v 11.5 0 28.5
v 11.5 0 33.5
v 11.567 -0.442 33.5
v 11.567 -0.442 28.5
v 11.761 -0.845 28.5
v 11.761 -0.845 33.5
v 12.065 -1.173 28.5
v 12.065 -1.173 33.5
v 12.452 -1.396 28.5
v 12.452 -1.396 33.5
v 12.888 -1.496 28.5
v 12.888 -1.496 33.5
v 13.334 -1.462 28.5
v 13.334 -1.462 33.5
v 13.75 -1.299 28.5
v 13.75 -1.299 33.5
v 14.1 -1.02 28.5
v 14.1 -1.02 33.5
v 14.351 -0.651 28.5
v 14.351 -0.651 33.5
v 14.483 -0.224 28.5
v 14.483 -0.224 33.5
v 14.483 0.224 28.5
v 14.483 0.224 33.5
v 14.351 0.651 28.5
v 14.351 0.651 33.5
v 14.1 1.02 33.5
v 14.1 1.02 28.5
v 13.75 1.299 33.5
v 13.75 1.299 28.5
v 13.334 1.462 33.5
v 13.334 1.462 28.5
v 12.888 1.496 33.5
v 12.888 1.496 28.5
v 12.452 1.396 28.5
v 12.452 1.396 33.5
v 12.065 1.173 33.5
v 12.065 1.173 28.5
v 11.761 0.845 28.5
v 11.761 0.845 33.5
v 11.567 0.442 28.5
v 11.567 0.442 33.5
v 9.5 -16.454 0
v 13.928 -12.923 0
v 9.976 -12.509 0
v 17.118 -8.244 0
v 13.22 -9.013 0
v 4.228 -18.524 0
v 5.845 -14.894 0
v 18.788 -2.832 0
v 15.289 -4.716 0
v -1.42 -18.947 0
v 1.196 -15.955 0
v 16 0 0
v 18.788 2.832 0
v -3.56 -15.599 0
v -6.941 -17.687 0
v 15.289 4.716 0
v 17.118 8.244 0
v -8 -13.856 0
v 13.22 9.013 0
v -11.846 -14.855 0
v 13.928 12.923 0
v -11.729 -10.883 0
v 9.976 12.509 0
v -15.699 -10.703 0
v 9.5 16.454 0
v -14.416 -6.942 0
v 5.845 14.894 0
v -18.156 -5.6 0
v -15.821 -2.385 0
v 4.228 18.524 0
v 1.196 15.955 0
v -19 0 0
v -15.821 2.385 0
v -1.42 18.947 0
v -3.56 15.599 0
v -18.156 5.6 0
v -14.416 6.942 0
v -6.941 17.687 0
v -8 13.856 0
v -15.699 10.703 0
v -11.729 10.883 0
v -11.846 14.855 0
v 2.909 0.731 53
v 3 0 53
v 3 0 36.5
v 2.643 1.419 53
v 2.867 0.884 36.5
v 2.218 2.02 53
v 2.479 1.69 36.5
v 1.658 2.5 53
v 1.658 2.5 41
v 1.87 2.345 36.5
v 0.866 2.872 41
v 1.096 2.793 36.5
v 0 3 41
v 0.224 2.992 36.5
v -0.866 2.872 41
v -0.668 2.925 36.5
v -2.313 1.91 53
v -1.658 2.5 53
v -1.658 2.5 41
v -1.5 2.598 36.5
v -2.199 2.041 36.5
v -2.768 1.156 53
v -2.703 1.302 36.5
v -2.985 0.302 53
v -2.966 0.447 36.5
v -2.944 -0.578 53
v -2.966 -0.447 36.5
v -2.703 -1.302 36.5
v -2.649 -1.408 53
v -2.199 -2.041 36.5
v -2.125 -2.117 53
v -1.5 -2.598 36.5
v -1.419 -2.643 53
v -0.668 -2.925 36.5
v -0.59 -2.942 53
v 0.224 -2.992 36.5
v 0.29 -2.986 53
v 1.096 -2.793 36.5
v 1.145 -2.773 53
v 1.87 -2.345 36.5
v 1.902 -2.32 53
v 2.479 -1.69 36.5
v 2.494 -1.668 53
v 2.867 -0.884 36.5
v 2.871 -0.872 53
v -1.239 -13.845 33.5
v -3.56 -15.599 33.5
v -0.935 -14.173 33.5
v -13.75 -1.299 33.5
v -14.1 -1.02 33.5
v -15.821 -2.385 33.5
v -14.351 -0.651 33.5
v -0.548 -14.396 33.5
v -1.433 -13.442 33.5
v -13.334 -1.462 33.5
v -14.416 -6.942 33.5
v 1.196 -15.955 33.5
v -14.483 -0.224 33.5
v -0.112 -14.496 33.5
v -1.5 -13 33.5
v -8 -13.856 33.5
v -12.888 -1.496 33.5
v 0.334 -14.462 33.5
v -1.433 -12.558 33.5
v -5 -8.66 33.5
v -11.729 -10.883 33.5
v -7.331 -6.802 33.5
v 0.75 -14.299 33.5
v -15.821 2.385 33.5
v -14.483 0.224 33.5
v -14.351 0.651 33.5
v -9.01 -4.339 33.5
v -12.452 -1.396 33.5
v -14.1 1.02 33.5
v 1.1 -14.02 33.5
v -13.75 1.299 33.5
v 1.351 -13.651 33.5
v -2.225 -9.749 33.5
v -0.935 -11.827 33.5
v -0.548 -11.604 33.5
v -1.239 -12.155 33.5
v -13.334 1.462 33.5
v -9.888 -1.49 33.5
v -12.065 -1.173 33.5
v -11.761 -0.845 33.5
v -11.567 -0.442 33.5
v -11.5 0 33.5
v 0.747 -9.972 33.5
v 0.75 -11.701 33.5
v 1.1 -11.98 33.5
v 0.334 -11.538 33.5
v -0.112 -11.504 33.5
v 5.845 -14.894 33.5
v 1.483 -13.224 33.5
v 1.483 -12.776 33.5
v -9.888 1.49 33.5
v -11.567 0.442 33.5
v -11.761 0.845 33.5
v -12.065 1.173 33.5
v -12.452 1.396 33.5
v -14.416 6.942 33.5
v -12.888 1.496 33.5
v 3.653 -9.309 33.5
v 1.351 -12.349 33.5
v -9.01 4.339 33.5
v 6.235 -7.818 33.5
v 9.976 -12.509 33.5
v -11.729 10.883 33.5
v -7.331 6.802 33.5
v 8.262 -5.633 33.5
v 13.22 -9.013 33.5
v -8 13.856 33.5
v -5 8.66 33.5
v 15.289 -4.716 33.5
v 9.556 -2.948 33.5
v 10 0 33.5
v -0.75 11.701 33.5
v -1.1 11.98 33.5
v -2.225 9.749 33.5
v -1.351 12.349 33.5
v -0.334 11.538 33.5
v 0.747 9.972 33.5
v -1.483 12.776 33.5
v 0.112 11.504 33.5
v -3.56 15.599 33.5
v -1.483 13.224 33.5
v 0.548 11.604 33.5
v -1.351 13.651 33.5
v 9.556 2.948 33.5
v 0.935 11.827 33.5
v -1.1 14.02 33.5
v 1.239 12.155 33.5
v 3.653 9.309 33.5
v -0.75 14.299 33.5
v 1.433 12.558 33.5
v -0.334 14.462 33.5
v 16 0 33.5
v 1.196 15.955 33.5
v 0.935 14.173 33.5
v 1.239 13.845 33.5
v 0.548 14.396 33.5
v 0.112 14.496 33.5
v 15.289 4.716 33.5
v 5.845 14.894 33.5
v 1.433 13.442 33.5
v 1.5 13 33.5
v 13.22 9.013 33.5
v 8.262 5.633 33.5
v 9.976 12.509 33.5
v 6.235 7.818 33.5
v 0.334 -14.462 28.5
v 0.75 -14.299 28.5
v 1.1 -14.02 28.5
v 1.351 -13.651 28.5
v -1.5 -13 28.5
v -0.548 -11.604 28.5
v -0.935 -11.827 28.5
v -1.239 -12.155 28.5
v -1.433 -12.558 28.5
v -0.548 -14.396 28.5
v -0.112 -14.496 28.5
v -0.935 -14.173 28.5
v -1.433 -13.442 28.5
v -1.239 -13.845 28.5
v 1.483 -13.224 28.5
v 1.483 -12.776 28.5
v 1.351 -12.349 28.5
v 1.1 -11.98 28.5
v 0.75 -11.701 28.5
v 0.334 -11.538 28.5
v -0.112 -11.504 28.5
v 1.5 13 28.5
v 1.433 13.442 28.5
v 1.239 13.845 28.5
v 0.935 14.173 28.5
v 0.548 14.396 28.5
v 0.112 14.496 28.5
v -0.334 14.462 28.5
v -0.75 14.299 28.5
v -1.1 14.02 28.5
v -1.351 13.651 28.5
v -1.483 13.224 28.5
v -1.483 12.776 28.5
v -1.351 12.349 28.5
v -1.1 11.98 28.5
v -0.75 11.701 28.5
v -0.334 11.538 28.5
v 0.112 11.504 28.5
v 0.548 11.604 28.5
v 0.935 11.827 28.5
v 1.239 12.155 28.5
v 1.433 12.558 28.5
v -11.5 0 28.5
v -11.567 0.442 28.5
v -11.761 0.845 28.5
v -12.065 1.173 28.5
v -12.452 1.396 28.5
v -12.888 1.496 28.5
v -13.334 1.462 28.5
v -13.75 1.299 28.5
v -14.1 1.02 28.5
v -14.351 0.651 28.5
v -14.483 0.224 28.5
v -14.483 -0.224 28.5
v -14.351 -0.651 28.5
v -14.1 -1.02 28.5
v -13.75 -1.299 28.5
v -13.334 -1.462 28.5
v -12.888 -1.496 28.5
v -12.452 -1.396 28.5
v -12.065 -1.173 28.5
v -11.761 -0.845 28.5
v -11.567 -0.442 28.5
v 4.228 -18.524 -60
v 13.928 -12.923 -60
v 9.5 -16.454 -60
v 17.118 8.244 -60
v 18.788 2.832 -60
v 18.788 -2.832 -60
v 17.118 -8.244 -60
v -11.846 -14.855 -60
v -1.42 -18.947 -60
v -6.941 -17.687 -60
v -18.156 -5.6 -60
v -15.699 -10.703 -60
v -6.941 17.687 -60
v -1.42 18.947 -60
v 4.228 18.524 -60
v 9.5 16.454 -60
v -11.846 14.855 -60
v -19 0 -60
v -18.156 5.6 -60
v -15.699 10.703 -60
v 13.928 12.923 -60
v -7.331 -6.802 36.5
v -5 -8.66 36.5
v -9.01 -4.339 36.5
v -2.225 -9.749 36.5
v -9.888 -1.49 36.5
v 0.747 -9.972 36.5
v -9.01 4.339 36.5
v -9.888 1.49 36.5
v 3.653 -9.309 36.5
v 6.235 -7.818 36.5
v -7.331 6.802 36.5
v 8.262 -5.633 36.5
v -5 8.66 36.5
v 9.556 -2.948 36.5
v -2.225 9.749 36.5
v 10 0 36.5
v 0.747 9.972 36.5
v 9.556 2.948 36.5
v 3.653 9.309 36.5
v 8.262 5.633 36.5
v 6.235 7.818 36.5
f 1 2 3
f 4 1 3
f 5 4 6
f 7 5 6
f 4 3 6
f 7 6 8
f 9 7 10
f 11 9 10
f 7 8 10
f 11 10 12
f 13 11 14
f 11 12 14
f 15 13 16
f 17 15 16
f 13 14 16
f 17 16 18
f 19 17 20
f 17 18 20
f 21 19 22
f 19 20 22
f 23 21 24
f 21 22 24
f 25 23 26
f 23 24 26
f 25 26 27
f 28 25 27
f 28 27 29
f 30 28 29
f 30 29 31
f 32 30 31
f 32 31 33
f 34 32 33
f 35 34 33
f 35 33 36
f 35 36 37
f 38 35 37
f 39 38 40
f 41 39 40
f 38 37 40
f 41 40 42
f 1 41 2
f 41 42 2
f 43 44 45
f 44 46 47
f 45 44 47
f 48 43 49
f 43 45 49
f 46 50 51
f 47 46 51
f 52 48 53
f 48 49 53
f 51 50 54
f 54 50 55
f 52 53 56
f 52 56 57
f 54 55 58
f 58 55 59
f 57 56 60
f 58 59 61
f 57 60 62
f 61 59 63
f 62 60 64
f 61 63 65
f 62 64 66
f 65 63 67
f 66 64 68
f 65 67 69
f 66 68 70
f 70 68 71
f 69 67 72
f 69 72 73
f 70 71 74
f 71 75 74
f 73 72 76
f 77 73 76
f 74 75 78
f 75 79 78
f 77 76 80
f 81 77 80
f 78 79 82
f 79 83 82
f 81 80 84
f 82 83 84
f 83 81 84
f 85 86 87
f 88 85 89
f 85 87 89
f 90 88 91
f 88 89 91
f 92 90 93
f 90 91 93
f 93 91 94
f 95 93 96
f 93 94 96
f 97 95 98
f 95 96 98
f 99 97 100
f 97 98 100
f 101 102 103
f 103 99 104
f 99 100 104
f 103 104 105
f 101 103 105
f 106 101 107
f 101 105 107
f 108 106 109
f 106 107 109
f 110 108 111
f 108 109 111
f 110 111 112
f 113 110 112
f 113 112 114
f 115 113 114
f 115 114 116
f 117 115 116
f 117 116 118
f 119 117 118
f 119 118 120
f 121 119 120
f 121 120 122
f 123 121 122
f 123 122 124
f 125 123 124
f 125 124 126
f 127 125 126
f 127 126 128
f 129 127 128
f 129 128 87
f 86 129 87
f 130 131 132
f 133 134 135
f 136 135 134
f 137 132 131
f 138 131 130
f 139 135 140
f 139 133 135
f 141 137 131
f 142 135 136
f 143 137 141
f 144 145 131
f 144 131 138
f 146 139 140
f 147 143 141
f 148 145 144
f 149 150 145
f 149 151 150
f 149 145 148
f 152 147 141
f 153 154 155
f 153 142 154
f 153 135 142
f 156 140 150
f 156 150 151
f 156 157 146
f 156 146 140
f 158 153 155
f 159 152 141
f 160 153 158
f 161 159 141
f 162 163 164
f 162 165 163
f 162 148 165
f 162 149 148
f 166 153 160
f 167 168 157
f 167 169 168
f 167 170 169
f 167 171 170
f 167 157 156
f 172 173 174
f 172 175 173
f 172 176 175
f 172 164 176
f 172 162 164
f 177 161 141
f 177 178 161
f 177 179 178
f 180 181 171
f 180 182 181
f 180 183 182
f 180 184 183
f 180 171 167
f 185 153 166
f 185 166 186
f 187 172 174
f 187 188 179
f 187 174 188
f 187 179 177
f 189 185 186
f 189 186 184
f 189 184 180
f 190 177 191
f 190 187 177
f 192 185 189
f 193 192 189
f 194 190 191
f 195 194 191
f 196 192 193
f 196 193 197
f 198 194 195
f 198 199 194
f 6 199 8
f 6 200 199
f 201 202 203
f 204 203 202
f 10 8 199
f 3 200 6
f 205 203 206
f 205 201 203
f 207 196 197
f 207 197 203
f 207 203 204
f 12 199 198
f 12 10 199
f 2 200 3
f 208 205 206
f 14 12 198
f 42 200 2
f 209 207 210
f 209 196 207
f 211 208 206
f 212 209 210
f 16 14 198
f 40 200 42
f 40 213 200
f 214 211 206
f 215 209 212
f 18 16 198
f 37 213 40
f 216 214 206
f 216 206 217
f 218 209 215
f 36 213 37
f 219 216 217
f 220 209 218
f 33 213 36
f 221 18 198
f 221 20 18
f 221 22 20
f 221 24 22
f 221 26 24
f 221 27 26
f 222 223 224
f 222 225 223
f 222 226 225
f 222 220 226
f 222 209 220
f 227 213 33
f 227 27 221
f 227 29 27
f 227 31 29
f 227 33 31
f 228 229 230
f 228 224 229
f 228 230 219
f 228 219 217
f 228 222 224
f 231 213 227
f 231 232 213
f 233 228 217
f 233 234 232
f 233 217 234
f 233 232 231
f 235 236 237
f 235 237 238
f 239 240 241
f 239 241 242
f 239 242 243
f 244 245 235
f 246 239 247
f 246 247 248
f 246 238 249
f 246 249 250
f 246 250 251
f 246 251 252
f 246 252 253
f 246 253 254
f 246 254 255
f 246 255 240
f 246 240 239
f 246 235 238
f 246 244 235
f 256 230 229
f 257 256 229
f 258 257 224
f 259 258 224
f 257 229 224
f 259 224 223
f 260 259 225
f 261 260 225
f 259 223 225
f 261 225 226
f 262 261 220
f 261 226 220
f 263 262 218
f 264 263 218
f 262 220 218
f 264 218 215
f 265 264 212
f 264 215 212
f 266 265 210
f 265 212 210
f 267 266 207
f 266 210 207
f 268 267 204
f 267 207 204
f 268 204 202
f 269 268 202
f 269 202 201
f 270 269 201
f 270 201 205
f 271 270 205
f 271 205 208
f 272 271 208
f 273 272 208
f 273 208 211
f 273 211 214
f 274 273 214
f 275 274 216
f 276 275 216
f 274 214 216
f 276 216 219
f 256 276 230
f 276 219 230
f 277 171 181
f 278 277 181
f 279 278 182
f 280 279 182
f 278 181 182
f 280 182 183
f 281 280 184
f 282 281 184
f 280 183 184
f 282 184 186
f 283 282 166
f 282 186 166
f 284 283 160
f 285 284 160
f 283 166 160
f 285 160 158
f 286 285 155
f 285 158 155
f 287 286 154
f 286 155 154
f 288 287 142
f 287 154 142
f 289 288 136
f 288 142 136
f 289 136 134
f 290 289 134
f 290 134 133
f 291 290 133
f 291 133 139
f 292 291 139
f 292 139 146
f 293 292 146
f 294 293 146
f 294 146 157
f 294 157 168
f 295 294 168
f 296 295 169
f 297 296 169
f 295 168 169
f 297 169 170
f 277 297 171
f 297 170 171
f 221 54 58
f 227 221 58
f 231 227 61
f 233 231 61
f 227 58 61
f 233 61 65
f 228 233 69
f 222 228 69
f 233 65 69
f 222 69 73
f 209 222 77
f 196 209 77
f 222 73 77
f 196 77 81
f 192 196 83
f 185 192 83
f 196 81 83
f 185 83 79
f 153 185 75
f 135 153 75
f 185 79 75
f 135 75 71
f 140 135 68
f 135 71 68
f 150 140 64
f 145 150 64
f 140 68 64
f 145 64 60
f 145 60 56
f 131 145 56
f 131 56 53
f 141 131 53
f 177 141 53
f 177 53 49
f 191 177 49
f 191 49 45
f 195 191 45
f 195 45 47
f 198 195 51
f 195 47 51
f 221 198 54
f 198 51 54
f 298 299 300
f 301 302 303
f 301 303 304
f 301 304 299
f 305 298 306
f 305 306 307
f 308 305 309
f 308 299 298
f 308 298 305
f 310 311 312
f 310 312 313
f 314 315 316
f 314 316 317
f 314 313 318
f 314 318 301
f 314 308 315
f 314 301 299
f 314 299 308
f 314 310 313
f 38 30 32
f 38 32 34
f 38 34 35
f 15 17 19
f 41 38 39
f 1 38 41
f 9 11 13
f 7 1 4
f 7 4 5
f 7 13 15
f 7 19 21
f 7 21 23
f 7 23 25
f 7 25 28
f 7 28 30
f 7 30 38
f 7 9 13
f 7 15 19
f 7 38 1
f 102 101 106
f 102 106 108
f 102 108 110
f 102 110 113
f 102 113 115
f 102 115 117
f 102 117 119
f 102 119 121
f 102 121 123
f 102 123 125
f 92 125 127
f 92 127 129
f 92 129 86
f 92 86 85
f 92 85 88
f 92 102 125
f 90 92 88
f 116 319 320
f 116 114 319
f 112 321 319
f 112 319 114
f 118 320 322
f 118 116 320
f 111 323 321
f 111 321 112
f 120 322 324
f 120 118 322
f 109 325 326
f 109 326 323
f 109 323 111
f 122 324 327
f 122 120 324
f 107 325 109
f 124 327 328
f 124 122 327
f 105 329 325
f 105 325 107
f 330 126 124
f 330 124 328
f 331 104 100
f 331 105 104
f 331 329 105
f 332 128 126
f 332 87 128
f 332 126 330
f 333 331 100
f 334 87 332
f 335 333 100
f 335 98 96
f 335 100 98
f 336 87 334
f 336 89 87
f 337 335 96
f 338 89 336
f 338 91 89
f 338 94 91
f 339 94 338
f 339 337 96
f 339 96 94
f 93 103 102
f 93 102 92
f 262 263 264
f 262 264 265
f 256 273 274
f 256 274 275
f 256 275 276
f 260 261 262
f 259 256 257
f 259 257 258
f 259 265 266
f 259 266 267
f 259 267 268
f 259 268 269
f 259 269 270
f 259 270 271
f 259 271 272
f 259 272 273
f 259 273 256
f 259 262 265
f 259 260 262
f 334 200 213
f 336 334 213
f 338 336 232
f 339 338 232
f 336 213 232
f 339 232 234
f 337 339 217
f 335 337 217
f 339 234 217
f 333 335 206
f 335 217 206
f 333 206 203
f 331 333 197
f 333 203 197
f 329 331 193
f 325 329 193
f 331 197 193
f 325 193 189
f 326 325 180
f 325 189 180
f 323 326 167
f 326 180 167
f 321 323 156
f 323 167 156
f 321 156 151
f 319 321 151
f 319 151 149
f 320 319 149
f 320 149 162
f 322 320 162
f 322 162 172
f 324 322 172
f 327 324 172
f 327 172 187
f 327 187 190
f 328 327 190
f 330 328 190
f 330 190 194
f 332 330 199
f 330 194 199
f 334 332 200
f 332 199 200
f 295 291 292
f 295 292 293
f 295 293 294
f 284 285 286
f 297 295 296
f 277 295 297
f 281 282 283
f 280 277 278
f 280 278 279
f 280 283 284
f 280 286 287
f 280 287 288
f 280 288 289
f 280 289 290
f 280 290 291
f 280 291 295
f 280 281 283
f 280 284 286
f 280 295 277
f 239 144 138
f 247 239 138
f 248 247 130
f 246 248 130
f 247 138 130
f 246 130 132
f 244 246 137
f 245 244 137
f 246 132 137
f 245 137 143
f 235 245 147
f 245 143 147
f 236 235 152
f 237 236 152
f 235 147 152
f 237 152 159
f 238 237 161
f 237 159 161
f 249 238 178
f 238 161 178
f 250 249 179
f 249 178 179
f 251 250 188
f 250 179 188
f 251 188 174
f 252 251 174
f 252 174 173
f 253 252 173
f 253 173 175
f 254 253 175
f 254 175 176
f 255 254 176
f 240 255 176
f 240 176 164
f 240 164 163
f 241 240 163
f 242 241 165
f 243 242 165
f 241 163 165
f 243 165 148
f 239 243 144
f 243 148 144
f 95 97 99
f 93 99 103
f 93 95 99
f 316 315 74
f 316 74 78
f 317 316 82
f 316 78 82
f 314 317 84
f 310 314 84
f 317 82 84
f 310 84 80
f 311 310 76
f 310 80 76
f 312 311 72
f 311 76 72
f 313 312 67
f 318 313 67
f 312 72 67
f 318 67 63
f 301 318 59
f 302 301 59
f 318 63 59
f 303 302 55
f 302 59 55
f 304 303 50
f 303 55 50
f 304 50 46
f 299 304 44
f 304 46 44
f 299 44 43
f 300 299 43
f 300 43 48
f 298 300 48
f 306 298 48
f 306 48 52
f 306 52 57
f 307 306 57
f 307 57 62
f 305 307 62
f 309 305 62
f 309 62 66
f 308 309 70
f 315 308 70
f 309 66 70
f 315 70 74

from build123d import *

# Parameters (mm, degrees)
SKETCH_1_R          = 16
EXTRUDE_1_DEPTH     = 33.5
SKETCH_2_R          = 10
EXTRUDE_2_DEPTH     = 3
SKETCH_3_R          = 3
EXTRUDE_3_DEPTH     = 16.5
CUT_EXTRUDE_START   = 3
SKETCH_4_W          = 9.243576196
SKETCH_4_H          = 12
CUT_EXTRUDE_1_DEPTH = 0.5
SKETCH_5_R          = 19
EXTRUDE_4_DEPTH     = 60
SKETCH_6_R          = 1.5
CUT_EXTRUDE_2_DEPTH = 5


with BuildPart() as part:
    # ｽｹｯﾁ1 → ﾎﾞｽ - 押し出し1 (new body)
    with BuildSketch(Plane.XY):
        Circle(SKETCH_1_R)
    extrude(amount=EXTRUDE_1_DEPTH)

    # ｽｹｯﾁ2 → ﾎﾞｽ - 押し出し2 (add)
    with BuildSketch(Plane.XY.offset(33.5)):
        Circle(SKETCH_2_R)
    extrude(amount=EXTRUDE_2_DEPTH)

    # ｽｹｯﾁ3 → ﾎﾞｽ - 押し出し3 (add)
    with BuildSketch(Plane.XY.offset(36.5)):
        Circle(SKETCH_3_R)
    extrude(amount=EXTRUDE_3_DEPTH)

    # ｽｹｯﾁ4 → ｶｯﾄ - 押し出し1 (cut)
    with BuildSketch(Plane(origin=(0, 0, 0), x_dir=(1, 0, 0), z_dir=(0, 1, 0)).offset(CUT_EXTRUDE_START)):
        with Locations((0, -47)):
            Rectangle(SKETCH_4_W, SKETCH_4_H)
    extrude(amount=-CUT_EXTRUDE_1_DEPTH, mode=Mode.SUBTRACT)

    # ｽｹｯﾁ5 → ﾎﾞｽ - 押し出し4 (add)
    with BuildSketch(Plane(origin=(0, 0, 0), x_dir=(-1, 0, 0), z_dir=(0, 0, -1))):
        Circle(SKETCH_5_R)
    extrude(amount=EXTRUDE_4_DEPTH)

    # ｽｹｯﾁ6 → ｶｯﾄ - 押し出し2 (cut)
    with BuildSketch(Plane.XY.offset(33.5)):
        with Locations((0, 13)):
            Circle(SKETCH_6_R)
        with Locations((-13, 0)):
            Circle(SKETCH_6_R)
        with Locations(Location((13, 0, 0), (0, 0, 180))):
            Circle(SKETCH_6_R)
        with Locations(Location((0, -13, 0), (0, 0, 180))):
            Circle(SKETCH_6_R)
    extrude(amount=-CUT_EXTRUDE_2_DEPTH, mode=Mode.SUBTRACT)


solid = part.part
